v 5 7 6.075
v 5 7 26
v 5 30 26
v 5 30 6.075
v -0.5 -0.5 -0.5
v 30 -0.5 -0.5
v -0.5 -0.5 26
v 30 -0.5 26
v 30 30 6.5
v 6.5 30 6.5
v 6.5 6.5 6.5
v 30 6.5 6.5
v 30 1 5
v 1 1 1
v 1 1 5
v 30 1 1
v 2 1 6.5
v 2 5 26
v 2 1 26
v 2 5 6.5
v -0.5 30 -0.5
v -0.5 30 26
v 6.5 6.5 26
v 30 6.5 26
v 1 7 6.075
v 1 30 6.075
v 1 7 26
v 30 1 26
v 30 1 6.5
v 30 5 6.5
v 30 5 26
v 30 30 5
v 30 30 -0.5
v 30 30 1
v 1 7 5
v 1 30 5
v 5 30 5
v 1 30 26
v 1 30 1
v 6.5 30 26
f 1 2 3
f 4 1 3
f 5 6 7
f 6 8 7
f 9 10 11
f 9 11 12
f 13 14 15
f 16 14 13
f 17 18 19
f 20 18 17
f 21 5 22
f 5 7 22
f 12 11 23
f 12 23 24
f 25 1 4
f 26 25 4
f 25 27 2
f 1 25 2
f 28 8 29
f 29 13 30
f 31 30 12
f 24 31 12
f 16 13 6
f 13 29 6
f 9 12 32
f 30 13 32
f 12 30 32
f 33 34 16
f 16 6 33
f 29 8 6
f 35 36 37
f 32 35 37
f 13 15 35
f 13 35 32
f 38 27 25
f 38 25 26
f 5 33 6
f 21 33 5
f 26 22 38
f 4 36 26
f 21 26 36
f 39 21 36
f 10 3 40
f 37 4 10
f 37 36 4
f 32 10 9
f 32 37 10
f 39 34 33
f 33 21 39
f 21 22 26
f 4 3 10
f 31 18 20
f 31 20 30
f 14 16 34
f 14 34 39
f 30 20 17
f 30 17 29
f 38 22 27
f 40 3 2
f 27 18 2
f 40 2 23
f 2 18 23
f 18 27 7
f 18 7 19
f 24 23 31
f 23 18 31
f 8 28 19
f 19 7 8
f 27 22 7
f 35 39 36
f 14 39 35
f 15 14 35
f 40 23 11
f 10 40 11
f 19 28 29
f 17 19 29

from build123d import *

# Parameters (mm, degrees)
SKETCH1_W            = 30
SKETCH1_H            = 30
BOSS_EXTRUDE1_DEPTH  = 6
BOSS_EXTRUDE4_DEPTH  = 20
SKETCH4_W            = 2
SKETCH4_H            = 2
BOSS_EXTRUDE6_DEPTH  = 20
SKETCH5_W            = 24
SKETCH5_H            = 6
BOSS_EXTRUDE7_DEPTH  = 20
SHELL2_START         = 7
SHELL2_DEPTH         = 23
SHELL2_START_2       = 1
SHELL2_2_DEPTH       = 4
SHELL2_START_3       = 5
SHELL2_3_OUTLINE_W   = 29
SHELL2_3_OUTLINE_H   = 4
SHELL2_3_DEPTH       = 2
SKETCH7_W            = 23
SKETCH7_H            = 1
BOSS_EXTRUDE8_DEPTH  = 5
SKETCH9_W            = 1.075143629
SKETCH9_H            = 23
BOSS_EXTRUDE9_DEPTH  = 5
SKETCH10_W           = 4
SKETCH10_H           = 23
CUT_EXTRUDE1_DEPTH   = 10
SKETCH11_W           = 23
SKETCH11_H           = 4
CUT_EXTRUDE2_DEPTH   = 10
BOSS_EXTRUDE10_DEPTH = 20
SKETCH13_W           = 20
SKETCH13_H           = 4
CUT_EXTRUDE3_DEPTH   = 5
SKETCH14_W           = 30
SKETCH14_H           = 26
BOSS_EXTRUDE11_DEPTH = 0.5
SKETCH15_W           = 26
SKETCH15_H           = 30.5
BOSS_EXTRUDE12_DEPTH = 0.5
SKETCH16_W           = 20
SKETCH16_H           = 24
BOSS_EXTRUDE13_DEPTH = 0.5
SKETCH19_W           = 30.5
SKETCH19_H           = 30.5
BOSS_EXTRUDE14_DEPTH = 0.5
SKETCH20_W           = 23.5
SKETCH20_H           = 24
BOSS_EXTRUDE15_DEPTH = 0.5
SKETCH21_W           = 23.5
SKETCH21_H           = 19.5
BOSS_EXTRUDE16_DEPTH = 0.5
SKETCH25_W           = 28
SKETCH25_H           = 4
BOSS_EXTRUDE17_DEPTH = 0.5


# Read off the part's stored shape, not the designer's step: Shell2
with BuildPart() as part:
    # Sketch1 → Boss-Extrude1 (new body)
    with BuildSketch(Plane.XY):
        with Locations((15, 15)):
            Rectangle(SKETCH1_W, SKETCH1_H)
    extrude(amount=BOSS_EXTRUDE1_DEPTH)

    # Sketch2 → Boss-Extrude4 (add)
    with BuildSketch(Plane.XY.offset(6)):
        Polygon((5, 6), (6, 6), (6, 30), (0, 30), (0, 6), align=None)
    extrude(amount=BOSS_EXTRUDE4_DEPTH)

    # Sketch4 → Boss-Extrude6 (add)
    with BuildSketch(Plane.XY.offset(6)):
        with Locations((5, 5)):
            Rectangle(SKETCH4_W, SKETCH4_H)
    extrude(amount=BOSS_EXTRUDE6_DEPTH)

    # Sketch5 → Boss-Extrude7 (add)
    with BuildSketch(Plane.XY.offset(6)):
        with Locations((18, 3)):
            Rectangle(SKETCH5_W, SKETCH5_H)
    extrude(amount=BOSS_EXTRUDE7_DEPTH)

    # Shell2 outline → Shell2 (cut)
    with BuildSketch(Plane(origin=(0, 0, 0), x_dir=(1, 0, 0), z_dir=(0, 1, 0)).offset(SHELL2_START)):
        Polygon((5, -5), (30, -5), (30, -1), (1, -1), (1, -25), (5, -25), align=None)
    extrude(amount=SHELL2_DEPTH, mode=Mode.SUBTRACT)

    # Shell2 2 outline → Shell2 2 (cut)
    with BuildSketch(Plane(origin=(0, 0, 0), x_dir=(1, 0, 0), z_dir=(0, 1, 0)).offset(SHELL2_START_2)):
        Polygon((7, -5), (7, -25), (30, -25), (30, -1), (1, -1), (1, -5), align=None)
    extrude(amount=SHELL2_2_DEPTH, mode=Mode.SUBTRACT)

    # Shell2 3 outline → Shell2 3 (cut)
    with BuildSketch(Plane(origin=(0, 0, 0), x_dir=(1, 0, 0), z_dir=(0, 1, 0)).offset(SHELL2_START_3)):
        with Locations((15.5, -3)):
            Rectangle(SHELL2_3_OUTLINE_W, SHELL2_3_OUTLINE_H)
    extrude(amount=SHELL2_3_DEPTH, mode=Mode.SUBTRACT)

    # Sketch7 → Boss-Extrude8 (add)
    with BuildSketch(Plane.XZ.offset(-5)):
        with Locations((18.5, 5.5)):
            Rectangle(SKETCH7_W, SKETCH7_H)
    extrude(amount=BOSS_EXTRUDE8_DEPTH)

    # Sketch9 → Boss-Extrude9 (add)
    with BuildSketch(Plane.ZY.offset(-5)):
        with Locations((5.537571814, 18.5)):
            Rectangle(SKETCH9_W, SKETCH9_H)
    extrude(amount=BOSS_EXTRUDE9_DEPTH)

    # Sketch10 → Cut-Extrude1 (cut)
    with BuildSketch(Plane.XY.offset(26)):
        with Locations((3, 18.5)):
            Rectangle(SKETCH10_W, SKETCH10_H)
    extrude(amount=-CUT_EXTRUDE1_DEPTH, mode=Mode.SUBTRACT)

    # Sketch11 → Cut-Extrude2 (cut)
    with BuildSketch(Plane.XY.offset(26)):
        with Locations((18.5, 3)):
            Rectangle(SKETCH11_W, SKETCH11_H)
    extrude(amount=-CUT_EXTRUDE2_DEPTH, mode=Mode.SUBTRACT)

    # Sketch12 → Boss-Extrude10 (add)
    with BuildSketch(Plane.XY.offset(6)):
        Polygon((6, 0), (6, 4), (4, 4), (4, 6), (0, 6), (0, 0), align=None)
    extrude(amount=BOSS_EXTRUDE10_DEPTH)

    # Sketch13 → Cut-Extrude3 (cut)
    with BuildSketch(Plane(origin=(7, 0, 0), x_dir=(0, 0, -1), z_dir=(1, 0, 0))):
        with Locations((-16, 3)):
            Rectangle(SKETCH13_W, SKETCH13_H)
    extrude(amount=-CUT_EXTRUDE3_DEPTH, mode=Mode.SUBTRACT)

    # Sketch14 → Boss-Extrude11 (add)
    with BuildSketch(Plane.XZ):
        with Locations((15, 13)):
            Rectangle(SKETCH14_W, SKETCH14_H)
    extrude(amount=BOSS_EXTRUDE11_DEPTH)

    # Sketch15 → Boss-Extrude12 (add)
    with BuildSketch(Plane.ZY):
        with Locations((13, 14.75)):
            Rectangle(SKETCH15_W, SKETCH15_H)
    extrude(amount=BOSS_EXTRUDE12_DEPTH)

    # Sketch16 → Boss-Extrude13 (add)
    with BuildSketch(Plane(origin=(6, 0, 0), x_dir=(0, 0, -1), z_dir=(1, 0, 0))):
        with Locations((-16, 18)):
            Rectangle(SKETCH16_W, SKETCH16_H)
    extrude(amount=BOSS_EXTRUDE13_DEPTH)

    # Sketch19 → Boss-Extrude14 (add)
    with BuildSketch(Plane(origin=(0, 0, 0), x_dir=(-1, 0, 0), z_dir=(0, 0, -1))):
        with Locations((-14.75, 14.75)):
            Rectangle(SKETCH19_W, SKETCH19_H)
    extrude(amount=BOSS_EXTRUDE14_DEPTH)

    # Sketch20 → Boss-Extrude15 (add)
    with BuildSketch(Plane.XY.offset(6)):
        with Locations((18.25, 18)):
            Rectangle(SKETCH20_W, SKETCH20_H)
    extrude(amount=BOSS_EXTRUDE15_DEPTH)

    # Sketch21 → Boss-Extrude16 (add)
    with BuildSketch(Plane(origin=(0, 6, 0), x_dir=(1, 0, 0), z_dir=(0, 1, 0))):
        with Locations((18.25, -16.25)):
            Rectangle(SKETCH21_W, SKETCH21_H)
    extrude(amount=BOSS_EXTRUDE16_DEPTH)

    # Sketch25 → Boss-Extrude17 (add)
    with BuildSketch(Plane.XY.offset(6)):
        with Locations((16, 3)):
            Rectangle(SKETCH25_W, SKETCH25_H)
    extrude(amount=BOSS_EXTRUDE17_DEPTH)


solid = part.part
